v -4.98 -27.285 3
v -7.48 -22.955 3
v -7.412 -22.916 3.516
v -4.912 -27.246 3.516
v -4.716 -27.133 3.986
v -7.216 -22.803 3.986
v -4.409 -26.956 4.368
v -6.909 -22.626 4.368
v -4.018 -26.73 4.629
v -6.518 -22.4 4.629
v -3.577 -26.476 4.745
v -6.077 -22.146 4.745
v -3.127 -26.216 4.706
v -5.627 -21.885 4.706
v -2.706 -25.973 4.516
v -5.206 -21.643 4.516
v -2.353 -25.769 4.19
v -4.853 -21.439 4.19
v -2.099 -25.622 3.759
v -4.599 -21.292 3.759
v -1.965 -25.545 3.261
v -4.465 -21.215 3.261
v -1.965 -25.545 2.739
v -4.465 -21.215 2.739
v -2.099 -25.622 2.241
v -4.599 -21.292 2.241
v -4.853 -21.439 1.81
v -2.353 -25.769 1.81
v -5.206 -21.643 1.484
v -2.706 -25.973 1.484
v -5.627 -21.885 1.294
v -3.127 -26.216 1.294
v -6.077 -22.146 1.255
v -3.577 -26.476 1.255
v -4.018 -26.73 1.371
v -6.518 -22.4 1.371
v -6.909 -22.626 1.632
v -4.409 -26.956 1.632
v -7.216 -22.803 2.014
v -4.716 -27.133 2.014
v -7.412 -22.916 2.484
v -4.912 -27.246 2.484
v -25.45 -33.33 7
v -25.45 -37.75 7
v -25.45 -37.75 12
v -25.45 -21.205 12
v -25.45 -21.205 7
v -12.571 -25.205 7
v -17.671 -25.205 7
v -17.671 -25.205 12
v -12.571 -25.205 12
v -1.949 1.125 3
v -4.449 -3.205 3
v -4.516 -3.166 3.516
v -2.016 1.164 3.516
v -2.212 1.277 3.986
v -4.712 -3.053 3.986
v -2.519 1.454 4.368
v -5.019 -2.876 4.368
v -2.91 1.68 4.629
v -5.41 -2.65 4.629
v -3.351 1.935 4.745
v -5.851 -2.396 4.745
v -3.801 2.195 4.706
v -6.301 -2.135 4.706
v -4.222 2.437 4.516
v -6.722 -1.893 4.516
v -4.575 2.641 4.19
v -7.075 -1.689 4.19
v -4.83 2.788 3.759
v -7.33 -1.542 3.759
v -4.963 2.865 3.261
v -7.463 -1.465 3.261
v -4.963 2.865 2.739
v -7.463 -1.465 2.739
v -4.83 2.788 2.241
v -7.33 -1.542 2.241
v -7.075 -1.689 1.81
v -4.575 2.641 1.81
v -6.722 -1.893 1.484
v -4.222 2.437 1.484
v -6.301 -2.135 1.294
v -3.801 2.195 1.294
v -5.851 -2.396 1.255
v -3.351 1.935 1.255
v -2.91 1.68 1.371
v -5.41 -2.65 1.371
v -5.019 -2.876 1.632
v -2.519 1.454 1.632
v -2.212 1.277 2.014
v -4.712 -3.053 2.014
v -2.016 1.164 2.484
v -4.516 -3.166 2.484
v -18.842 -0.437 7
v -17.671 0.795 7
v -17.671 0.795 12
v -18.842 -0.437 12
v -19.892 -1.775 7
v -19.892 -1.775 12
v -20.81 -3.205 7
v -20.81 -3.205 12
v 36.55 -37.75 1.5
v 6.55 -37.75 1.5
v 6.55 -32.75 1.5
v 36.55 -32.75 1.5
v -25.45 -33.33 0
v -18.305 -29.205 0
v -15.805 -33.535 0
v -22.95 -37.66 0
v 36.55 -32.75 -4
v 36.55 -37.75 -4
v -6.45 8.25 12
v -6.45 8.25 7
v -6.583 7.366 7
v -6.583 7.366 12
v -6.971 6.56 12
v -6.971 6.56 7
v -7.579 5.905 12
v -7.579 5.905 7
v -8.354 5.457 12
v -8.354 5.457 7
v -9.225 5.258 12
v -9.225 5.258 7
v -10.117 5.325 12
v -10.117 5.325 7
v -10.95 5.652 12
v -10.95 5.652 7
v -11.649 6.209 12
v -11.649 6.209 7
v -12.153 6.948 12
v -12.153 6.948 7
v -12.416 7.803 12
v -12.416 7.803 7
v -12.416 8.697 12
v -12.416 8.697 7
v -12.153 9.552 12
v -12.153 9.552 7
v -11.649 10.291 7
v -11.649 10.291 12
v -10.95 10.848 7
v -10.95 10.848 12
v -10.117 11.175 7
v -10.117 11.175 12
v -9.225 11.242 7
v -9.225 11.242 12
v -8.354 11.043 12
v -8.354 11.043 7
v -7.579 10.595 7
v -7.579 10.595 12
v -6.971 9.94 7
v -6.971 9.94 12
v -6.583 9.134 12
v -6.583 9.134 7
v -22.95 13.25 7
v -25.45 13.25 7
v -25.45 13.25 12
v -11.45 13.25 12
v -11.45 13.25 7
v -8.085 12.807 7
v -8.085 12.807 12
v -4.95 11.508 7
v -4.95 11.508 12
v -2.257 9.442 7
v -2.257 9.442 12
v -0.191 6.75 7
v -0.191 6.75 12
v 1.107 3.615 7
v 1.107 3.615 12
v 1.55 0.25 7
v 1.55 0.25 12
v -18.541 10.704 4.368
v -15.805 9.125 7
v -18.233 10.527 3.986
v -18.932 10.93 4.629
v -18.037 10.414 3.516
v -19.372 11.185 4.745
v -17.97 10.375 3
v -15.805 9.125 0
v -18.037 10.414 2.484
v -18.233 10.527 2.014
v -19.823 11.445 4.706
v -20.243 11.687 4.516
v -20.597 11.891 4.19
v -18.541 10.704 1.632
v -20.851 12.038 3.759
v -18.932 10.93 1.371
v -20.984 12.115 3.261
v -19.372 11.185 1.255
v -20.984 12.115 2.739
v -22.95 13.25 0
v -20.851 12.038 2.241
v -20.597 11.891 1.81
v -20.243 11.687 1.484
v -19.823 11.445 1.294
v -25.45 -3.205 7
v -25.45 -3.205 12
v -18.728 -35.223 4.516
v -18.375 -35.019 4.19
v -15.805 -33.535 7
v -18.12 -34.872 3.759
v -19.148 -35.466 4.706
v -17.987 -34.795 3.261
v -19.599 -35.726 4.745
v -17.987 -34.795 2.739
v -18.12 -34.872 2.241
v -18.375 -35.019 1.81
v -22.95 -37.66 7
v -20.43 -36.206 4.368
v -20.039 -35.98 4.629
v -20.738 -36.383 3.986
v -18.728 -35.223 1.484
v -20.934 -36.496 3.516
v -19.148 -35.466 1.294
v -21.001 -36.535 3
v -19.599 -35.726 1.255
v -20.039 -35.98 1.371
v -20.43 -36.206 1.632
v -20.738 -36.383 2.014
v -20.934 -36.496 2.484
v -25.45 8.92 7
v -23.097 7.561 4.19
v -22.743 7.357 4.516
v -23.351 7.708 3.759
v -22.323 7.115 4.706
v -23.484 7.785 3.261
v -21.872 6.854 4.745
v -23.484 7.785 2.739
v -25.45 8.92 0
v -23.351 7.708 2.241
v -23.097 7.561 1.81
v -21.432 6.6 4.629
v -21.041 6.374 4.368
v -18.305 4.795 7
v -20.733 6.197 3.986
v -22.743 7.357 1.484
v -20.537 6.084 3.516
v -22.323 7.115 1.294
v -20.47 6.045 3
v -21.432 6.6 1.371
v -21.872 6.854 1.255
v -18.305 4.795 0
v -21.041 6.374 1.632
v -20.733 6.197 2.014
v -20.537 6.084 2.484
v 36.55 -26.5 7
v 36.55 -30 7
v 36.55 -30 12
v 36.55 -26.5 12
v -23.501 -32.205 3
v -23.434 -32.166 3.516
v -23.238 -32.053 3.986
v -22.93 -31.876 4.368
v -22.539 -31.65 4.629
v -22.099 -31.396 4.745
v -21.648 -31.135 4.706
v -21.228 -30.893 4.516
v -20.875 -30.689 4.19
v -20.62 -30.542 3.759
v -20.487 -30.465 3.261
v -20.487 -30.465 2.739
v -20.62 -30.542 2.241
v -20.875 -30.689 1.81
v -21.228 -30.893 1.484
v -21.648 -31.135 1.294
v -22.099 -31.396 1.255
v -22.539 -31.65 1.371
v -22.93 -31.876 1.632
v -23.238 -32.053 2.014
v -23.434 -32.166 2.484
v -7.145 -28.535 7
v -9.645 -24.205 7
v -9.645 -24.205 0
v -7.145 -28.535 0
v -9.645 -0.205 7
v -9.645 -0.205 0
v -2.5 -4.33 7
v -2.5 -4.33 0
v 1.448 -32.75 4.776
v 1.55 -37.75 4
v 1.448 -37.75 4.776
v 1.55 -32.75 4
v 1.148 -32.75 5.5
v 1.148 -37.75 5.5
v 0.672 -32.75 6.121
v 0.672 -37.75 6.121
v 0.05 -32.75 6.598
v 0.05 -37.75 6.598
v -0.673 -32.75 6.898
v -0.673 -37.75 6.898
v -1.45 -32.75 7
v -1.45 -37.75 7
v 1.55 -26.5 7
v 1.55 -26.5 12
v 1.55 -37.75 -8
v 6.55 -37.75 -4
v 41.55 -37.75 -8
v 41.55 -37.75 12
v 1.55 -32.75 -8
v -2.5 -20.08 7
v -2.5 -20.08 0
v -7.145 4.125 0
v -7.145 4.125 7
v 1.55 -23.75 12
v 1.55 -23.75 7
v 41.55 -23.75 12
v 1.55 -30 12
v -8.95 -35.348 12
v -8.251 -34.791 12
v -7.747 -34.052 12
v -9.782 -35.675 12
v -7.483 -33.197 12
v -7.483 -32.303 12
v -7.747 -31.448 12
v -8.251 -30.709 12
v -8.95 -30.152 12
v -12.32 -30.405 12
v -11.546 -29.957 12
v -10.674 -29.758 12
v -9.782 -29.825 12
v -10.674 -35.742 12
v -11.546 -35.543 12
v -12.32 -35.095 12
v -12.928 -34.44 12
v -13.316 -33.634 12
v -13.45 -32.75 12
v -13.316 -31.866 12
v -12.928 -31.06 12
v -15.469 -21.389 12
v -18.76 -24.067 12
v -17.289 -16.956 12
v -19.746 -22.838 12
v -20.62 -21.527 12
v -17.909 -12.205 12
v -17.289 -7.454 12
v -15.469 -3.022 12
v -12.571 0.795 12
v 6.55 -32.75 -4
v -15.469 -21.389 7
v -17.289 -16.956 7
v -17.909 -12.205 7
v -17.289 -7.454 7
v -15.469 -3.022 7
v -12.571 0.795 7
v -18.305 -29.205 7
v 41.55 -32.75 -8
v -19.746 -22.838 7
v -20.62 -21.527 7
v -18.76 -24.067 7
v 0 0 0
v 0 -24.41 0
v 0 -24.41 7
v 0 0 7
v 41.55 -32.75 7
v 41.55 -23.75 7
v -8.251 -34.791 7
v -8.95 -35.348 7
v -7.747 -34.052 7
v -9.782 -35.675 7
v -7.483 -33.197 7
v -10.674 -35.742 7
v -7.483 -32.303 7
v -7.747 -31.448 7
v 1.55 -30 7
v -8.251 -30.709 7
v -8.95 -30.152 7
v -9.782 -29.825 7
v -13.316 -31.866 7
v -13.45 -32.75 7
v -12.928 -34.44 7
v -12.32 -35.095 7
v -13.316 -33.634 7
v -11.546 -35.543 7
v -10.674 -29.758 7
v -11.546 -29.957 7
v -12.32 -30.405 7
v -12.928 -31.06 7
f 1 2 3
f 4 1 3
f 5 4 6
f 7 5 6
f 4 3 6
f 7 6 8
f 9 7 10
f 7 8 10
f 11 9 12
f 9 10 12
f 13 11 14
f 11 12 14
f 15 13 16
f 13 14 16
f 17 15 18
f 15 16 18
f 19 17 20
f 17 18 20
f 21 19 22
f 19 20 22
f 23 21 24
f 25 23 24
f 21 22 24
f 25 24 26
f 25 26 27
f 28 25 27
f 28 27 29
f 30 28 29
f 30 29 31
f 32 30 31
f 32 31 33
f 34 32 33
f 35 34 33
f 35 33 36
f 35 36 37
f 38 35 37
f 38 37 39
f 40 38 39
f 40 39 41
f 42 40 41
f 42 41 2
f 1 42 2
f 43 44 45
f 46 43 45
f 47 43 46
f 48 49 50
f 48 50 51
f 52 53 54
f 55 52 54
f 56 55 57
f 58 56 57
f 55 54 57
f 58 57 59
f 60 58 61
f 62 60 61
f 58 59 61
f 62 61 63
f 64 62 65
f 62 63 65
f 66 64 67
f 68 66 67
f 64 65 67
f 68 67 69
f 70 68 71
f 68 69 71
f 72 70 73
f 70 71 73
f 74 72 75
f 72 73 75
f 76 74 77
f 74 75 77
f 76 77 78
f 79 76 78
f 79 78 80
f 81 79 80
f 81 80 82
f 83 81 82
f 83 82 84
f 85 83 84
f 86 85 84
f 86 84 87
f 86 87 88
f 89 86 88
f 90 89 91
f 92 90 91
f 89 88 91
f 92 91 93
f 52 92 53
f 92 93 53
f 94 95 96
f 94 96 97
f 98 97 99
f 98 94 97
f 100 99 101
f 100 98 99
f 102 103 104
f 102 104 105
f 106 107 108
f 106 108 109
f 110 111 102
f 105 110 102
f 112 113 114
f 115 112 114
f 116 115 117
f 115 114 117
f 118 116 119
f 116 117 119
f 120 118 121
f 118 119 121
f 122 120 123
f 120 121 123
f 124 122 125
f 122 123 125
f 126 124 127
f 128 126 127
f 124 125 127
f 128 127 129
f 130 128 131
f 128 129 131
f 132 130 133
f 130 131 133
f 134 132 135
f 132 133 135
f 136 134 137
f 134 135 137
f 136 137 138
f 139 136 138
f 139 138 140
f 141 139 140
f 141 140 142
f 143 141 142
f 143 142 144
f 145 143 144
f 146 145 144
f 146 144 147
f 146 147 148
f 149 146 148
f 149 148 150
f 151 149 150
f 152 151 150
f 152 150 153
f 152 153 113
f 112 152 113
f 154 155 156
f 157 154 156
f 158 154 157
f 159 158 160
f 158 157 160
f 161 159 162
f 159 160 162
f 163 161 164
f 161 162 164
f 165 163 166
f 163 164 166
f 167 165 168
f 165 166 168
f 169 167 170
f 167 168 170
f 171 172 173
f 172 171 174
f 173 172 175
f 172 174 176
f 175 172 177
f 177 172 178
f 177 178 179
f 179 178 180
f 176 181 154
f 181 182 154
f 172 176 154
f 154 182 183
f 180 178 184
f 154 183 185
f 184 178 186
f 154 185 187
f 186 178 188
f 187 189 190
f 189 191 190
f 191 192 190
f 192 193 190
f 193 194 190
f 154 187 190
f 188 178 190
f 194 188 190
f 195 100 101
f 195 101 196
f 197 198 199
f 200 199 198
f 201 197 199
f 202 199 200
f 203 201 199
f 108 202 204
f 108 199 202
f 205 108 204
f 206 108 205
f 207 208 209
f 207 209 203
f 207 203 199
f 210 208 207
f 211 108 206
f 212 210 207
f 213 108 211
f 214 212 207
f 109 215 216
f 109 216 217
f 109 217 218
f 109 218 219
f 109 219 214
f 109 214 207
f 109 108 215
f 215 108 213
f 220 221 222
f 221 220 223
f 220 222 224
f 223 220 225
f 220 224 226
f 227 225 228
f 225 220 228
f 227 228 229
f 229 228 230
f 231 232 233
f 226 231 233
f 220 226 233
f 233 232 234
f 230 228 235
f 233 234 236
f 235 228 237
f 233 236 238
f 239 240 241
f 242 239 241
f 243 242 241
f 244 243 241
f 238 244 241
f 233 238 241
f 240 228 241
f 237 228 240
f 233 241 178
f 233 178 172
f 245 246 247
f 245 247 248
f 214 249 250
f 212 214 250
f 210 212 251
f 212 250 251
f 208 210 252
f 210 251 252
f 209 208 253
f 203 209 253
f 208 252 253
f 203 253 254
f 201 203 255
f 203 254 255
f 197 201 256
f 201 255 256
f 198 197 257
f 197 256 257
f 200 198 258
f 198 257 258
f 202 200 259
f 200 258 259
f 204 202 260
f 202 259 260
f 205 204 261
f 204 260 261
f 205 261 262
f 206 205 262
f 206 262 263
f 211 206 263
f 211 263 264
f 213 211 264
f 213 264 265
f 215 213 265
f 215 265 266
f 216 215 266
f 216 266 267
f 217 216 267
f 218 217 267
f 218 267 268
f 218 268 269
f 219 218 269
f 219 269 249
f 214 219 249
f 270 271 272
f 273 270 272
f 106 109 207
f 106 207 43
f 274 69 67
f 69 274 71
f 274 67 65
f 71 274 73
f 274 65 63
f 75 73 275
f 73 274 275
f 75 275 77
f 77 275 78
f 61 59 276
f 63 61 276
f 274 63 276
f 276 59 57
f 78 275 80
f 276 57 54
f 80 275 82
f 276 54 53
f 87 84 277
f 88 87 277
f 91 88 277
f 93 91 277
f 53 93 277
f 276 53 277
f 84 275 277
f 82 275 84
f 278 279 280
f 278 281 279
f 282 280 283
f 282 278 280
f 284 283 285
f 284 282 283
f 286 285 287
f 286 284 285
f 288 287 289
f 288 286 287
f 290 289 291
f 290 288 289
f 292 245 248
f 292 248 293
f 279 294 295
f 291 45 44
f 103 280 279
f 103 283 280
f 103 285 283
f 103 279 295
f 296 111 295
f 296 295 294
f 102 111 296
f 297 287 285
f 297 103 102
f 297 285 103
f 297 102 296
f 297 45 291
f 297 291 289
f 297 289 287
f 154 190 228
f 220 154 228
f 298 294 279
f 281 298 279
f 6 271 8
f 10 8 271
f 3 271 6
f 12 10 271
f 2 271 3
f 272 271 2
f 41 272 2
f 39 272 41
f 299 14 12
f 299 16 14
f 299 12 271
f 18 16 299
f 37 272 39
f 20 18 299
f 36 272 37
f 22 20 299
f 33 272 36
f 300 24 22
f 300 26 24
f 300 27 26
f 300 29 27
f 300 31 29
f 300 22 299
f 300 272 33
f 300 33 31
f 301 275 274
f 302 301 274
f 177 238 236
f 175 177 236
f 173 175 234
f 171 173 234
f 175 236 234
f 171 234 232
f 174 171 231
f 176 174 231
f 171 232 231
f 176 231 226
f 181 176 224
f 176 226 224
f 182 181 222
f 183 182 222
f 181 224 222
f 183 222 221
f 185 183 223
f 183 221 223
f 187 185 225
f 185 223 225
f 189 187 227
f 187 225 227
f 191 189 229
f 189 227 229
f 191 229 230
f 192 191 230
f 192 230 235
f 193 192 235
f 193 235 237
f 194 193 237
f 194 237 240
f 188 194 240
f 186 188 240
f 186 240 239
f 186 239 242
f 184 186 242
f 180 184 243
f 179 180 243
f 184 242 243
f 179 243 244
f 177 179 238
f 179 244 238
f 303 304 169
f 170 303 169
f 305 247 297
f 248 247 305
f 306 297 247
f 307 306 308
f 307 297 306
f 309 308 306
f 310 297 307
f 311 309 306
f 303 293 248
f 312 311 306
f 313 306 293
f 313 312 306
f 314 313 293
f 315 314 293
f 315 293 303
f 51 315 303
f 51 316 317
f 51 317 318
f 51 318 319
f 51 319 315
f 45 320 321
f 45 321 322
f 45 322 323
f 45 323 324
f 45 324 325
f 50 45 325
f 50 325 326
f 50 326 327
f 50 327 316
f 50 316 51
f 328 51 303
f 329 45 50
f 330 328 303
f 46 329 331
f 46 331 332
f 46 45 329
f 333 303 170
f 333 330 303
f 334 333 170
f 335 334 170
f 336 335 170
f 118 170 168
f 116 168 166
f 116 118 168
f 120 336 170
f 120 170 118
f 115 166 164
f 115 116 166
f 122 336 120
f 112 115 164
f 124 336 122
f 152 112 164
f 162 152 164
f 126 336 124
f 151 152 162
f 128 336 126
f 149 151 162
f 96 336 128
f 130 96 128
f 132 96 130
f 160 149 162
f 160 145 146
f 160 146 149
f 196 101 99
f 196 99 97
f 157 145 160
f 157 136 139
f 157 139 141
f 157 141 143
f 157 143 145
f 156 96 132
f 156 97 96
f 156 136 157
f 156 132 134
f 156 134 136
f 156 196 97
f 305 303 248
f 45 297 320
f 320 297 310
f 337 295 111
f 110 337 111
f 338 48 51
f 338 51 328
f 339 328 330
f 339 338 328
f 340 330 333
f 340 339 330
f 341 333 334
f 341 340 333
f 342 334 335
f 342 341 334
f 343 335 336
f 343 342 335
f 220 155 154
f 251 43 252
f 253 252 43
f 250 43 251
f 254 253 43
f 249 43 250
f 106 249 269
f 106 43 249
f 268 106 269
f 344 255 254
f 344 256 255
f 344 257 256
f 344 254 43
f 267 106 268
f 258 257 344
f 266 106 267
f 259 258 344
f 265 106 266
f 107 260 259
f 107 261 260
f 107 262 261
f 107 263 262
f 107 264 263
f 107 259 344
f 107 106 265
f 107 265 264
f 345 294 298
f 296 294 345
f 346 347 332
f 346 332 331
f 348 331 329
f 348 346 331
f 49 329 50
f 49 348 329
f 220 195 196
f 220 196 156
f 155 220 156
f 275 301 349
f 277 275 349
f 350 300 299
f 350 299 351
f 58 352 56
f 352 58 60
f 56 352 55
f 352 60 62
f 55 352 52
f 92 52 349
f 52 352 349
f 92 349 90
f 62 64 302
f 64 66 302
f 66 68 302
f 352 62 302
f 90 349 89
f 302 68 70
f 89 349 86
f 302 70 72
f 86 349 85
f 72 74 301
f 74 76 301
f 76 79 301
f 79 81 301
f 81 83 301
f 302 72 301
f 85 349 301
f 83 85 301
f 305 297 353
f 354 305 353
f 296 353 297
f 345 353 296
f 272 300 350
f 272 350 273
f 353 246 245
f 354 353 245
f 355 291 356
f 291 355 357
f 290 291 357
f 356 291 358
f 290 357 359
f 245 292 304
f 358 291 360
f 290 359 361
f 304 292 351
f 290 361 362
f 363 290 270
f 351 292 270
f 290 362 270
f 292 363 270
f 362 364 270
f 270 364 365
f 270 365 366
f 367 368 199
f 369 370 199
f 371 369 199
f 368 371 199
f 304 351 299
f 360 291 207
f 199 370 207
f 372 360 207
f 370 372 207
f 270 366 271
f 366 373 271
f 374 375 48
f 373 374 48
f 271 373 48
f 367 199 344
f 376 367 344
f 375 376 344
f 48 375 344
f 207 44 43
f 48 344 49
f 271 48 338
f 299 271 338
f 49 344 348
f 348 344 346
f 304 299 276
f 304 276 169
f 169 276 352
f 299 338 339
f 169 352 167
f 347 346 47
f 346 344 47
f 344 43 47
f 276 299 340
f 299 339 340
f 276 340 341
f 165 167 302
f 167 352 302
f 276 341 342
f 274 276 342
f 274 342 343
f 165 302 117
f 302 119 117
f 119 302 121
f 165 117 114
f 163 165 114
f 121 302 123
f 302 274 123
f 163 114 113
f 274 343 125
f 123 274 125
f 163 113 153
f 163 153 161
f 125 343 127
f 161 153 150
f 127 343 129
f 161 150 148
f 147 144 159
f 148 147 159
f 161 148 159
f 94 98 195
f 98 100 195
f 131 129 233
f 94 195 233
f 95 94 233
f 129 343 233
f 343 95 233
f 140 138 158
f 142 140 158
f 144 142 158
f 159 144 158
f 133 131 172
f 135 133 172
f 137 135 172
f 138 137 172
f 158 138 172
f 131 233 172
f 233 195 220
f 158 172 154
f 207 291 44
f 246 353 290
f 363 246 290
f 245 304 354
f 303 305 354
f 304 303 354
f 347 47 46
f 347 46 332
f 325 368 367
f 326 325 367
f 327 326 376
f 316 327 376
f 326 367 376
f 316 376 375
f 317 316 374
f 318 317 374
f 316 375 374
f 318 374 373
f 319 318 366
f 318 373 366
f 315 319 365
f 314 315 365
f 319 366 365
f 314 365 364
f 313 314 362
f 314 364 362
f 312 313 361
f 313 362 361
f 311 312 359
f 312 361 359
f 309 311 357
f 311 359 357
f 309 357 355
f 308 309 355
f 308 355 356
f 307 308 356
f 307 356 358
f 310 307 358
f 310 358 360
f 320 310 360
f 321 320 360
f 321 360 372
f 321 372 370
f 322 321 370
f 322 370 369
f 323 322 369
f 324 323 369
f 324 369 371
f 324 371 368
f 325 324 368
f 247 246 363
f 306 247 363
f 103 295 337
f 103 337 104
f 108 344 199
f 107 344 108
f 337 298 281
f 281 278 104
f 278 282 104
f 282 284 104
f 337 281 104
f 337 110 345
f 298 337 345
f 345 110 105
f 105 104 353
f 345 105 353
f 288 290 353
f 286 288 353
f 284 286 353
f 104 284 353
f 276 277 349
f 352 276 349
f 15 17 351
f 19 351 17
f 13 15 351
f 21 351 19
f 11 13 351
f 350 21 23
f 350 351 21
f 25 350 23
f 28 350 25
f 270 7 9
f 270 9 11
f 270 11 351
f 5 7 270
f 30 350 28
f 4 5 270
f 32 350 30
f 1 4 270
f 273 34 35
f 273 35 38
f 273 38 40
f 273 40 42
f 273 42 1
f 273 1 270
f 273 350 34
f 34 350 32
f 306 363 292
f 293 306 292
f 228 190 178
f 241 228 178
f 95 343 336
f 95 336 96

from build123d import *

# Parameters (mm, degrees)
SALIENTE_EXTRUIR1_DEPTH   = 7
SALIENTE_EXTRUIR1_2_DEPTH = 7
CROQUIS2_W                = 27
CROQUIS2_H                = 51
SALIENTE_EXTRUIR2_DEPTH   = 5
CORTAR_EXTRUIR1_REACH     = 48.062
CROQUIS4_R                = 1.75
CORTAR_EXTRUIR2_DEPTH     = 5
CORTAR_EXTRUIR3_REACH     = 46.821
CROQUIS5_R                = 1.75
REDONDEO1_R               = 13
CROQUIS6_W                = 40
CROQUIS6_H                = 20
CROQUIS6_W_2              = 30
CROQUIS6_H_2              = 5.5
SALIENTE_EXTRUIR3_DEPTH   = 5
REDONDEO5_R               = 3
CORTAR_EXTRUIR4_REACH     = 46.821
CROQUIS7_W                = 10
CROQUIS7_H                = 7
CORTAR_EXTRUIR5_REACH     = 58.58
CROQUIS8_W                = 10
CROQUIS8_H                = 7
CORTAR_EXTRUIR6_REACH     = 60.108
CROQUIS10_W               = 5
CROQUIS10_H               = 9
SALIENTE_EXTRUIR4_DEPTH   = 40
CORTAR_EXTRUIR7_REACH     = 60.108
CROQUIS11_W               = 35
CROQUIS11_H               = 3.5
CORTAR_EXTRUIR8_REACH     = 60.108
CROQUIS12_R               = 3


with BuildPart() as part:
    # Croquis1 → Saliente-Extruir1 (new body)
    with BuildSketch(Plane.XY):
        Polygon((0, 0), (-22.9496732, 13.25), (-25.4496732, 8.919872981), (-2.5, -4.330127019), align=None)
    extrude(amount=SALIENTE_EXTRUIR1_DEPTH)



with BuildPart() as body_2:
    # Croquis1 → Saliente-Extruir1 2 (new body)
    with BuildSketch(Plane.XY):
        Polygon((-25.4496732, -33.330127019), (-2.5, -20.080127019), (0, -24.410254038), (-22.9496732, -37.660254038), align=None)
    extrude(amount=SALIENTE_EXTRUIR1_2_DEPTH)


with BuildPart() as part_1:
    add(part.part)

    add(body_2.part)  # Saliente-Extruir2 merges body 2
    # Croquis2 → Saliente-Extruir2 (add)
    with BuildSketch(Plane.XY.offset(7)):
        with Locations((-11.9496732, -12.25)):
            Rectangle(CROQUIS2_W, CROQUIS2_H)
    extrude(amount=SALIENTE_EXTRUIR2_DEPTH)

    # Croquis3 → Cortar-Extruir1 (cut, up to next)
    with BuildSketch(Plane(origin=(0, 0, 7), x_dir=(-1, 0, 0), z_dir=(0, 0, -1)), mode=Mode.PRIVATE) as cortar_extruir1_sk1:
        with BuildLine():
            Line((13.571492094, 0.794872981), (16.671492094, 0.794872981))
            Line((16.671492094, 0.794872981), (17.671492094, 0.794872981))
            ThreePointArc((17.671492094, 0.794872981), (23.221592496, -12.205127019), (17.671492094, -25.205127019))
            Line((17.671492094, -25.205127019), (16.671492094, -25.205127019))
            Line((16.671492094, -25.205127019), (13.571492094, -25.205127019))
            Line((13.571492094, -25.205127019), (12.571492094, -25.205127019))
            ThreePointArc((12.571492094, -25.205127019), (17.909045513, -12.205127019), (12.571492094, 0.794872981))
            Line((12.571492094, 0.794872981), (13.571492094, 0.794872981))
        make_face()
    cortar_extruir1_tool1 = extrude(cortar_extruir1_sk1.sketch, amount=-CORTAR_EXTRUIR1_REACH, mode=Mode.PRIVATE) & part_1.part
    add(cortar_extruir1_tool1.solids().sort_by_distance((-18.892381, -12.205127, 7))[0], mode=Mode.SUBTRACT)

    # Croquis4 → Cortar-Extruir2 (cut)
    with BuildSketch(Plane(origin=(-2.5, -4.330127019, 0), x_dir=(0.8660254037844369, -0.5000000000000031, 0), z_dir=(-0.500000000000003, -0.8660254037844368, 0))):
        with Locations((-22.5, 3)):
            Circle(CROQUIS4_R)
        with Locations((-4, 3)):
            Circle(CROQUIS4_R)
    extrude(amount=-CORTAR_EXTRUIR2_DEPTH, mode=Mode.SUBTRACT)

    # Croquis5 → Cortar-Extruir3 (cut, up to next)
    with BuildSketch(Plane(origin=(8.069950055, -13.977563509, 0), x_dir=(0.8660254037844367, 0.5000000000000033, 0), z_dir=(-0.5000000000000033, 0.8660254037844367, 0)), mode=Mode.PRIVATE) as cortar_extruir3_sk1:
        with Locations(Location((-34.705127019, -3, 0), (0, 0, 180))):
            Circle(CROQUIS5_R)
    cortar_extruir3_tool1 = extrude(cortar_extruir3_sk1.sketch, amount=-CORTAR_EXTRUIR3_REACH, mode=Mode.PRIVATE) & part_1.part
    # Croquis5 → Cortar-Extruir3 (cut, up to next)
    with BuildSketch(Plane(origin=(8.069950055, -13.977563509, 0), x_dir=(0.8660254037844367, 0.5000000000000033, 0), z_dir=(-0.5000000000000033, 0.8660254037844367, 0)), mode=Mode.PRIVATE) as cortar_extruir3_sk2:
        with Locations(Location((-16.205127019, -3, 0), (0, 0, 180))):
            Circle(CROQUIS5_R)
    cortar_extruir3_tool2 = extrude(cortar_extruir3_sk2.sketch, amount=-CORTAR_EXTRUIR3_REACH, mode=Mode.PRIVATE) & part_1.part
    add(cortar_extruir3_tool1.solids().sort_by_distance((-21.985572, -31.330127, 3))[0], mode=Mode.SUBTRACT)
    add(cortar_extruir3_tool2.solids().sort_by_distance((-5.964102, -22.080127, 3))[0], mode=Mode.SUBTRACT)

    # Redondeo1
    redondeo1_edges = [part_1.edges().sort_by_distance(p)[0] for p in [
        (1.5503268, 13.25, 9.5),
    ]]
    fillet(redondeo1_edges, radius=REDONDEO1_R)

    # Croquis6 → Saliente-Extruir3 (add)
    with BuildSketch(Plane.XZ.offset(37.75)):
        with Locations((21.5503268, 2)):
            Rectangle(CROQUIS6_W, CROQUIS6_H)
        with Locations((21.5503268, -1.25)):
            Rectangle(CROQUIS6_W_2, CROQUIS6_H_2, mode=Mode.SUBTRACT)
    extrude(amount=-SALIENTE_EXTRUIR3_DEPTH)

    # Redondeo5
    redondeo5_edges = [part_1.edges().sort_by_distance(p)[0] for p in [
        (1.5503268, -35.25, 7),
    ]]
    fillet(redondeo5_edges, radius=REDONDEO5_R)

    # Croquis7 → Cortar-Extruir4 (cut, up to next)
    with BuildSketch(Plane(origin=(8.069950055, -13.977563509, 0), x_dir=(0.8660254037844367, 0.5000000000000033, 0), z_dir=(-0.5000000000000033, 0.8660254037844367, 0)), mode=Mode.PRIVATE) as cortar_extruir4_sk1:
        with Locations((-25.455127019, -3.5)):
            Rectangle(CROQUIS7_W, CROQUIS7_H)
    cortar_extruir4_tool1 = extrude(cortar_extruir4_sk1.sketch, amount=-CORTAR_EXTRUIR4_REACH, mode=Mode.PRIVATE) & part_1.part
    add(cortar_extruir4_tool1.solids().sort_by_distance((-13.974837, -26.705127, 3.5))[0], mode=Mode.SUBTRACT)

    # Croquis8 → Cortar-Extruir5 (cut, up to next)
    with BuildSketch(Plane(origin=(-2.5, -4.330127019, 0), x_dir=(0.8660254037844369, -0.5000000000000031, 0), z_dir=(-0.500000000000003, -0.8660254037844368, 0)), mode=Mode.PRIVATE) as cortar_extruir5_sk1:
        with Locations((-13.25, 3.5)):
            Rectangle(CROQUIS8_W, CROQUIS8_H)
    cortar_extruir5_tool1 = extrude(cortar_extruir5_sk1.sketch, amount=-CORTAR_EXTRUIR5_REACH, mode=Mode.PRIVATE) & part_1.part
    add(cortar_extruir5_tool1.solids().sort_by_distance((-13.974837, 2.294873, 3.5))[0], mode=Mode.SUBTRACT)

    # Croquis9 → Cortar-Extruir6 (cut, up to next)
    with BuildSketch(Plane(origin=(0, 0, 7), x_dir=(-1, 0, 0), z_dir=(0, 0, -1)), mode=Mode.PRIVATE) as cortar_extruir6_sk1:
        with BuildLine():
            Line((25.4496732, -3.205127019), (25.4496732, -21.205127019))
            Line((25.4496732, -21.205127019), (20.619740445, -21.526985187))
            ThreePointArc((20.619740445, -21.526985187), (23.220621564, -12.392083108), (20.810049764, -3.205127019))
            Line((20.810049764, -3.205127019), (25.4496732, -3.205127019))
        make_face()
    cortar_extruir6_tool1 = extrude(cortar_extruir6_sk1.sketch, amount=-CORTAR_EXTRUIR6_REACH, mode=Mode.PRIVATE) & part_1.part
    add(cortar_extruir6_tool1.solids().sort_by_distance((-23.839782, -12.328925, 7))[0], mode=Mode.SUBTRACT)

    # Croquis10 → Saliente-Extruir4 (add)
    with BuildSketch(Plane(origin=(1.5503268, 0, 0), x_dir=(0, 0, -1), z_dir=(1, 0, 0))):
        with Locations((-9.5, -28.25)):
            Rectangle(CROQUIS10_W, CROQUIS10_H)
    extrude(amount=SALIENTE_EXTRUIR4_DEPTH)

    # Croquis11 → Cortar-Extruir7 (cut, up to next)
    with BuildSketch(Plane(origin=(0, 0, 7), x_dir=(-1, 0, 0), z_dir=(0, 0, -1)), mode=Mode.PRIVATE) as cortar_extruir7_sk1:
        with Locations((-19.0503268, -28.25)):
            Rectangle(CROQUIS11_W, CROQUIS11_H)
    cortar_extruir7_tool1 = extrude(cortar_extruir7_sk1.sketch, amount=-CORTAR_EXTRUIR7_REACH, mode=Mode.PRIVATE) & part_1.part
    add(cortar_extruir7_tool1.solids().sort_by_distance((19.050327, -28.25, 7))[0], mode=Mode.SUBTRACT)

    # Croquis12 → Cortar-Extruir8 (cut, up to next)
    with BuildSketch(Plane(origin=(0, 0, 7), x_dir=(-1, 0, 0), z_dir=(0, 0, -1)), mode=Mode.PRIVATE) as cortar_extruir8_sk1:
        with Locations((10.4496732, -32.75)):
            Circle(CROQUIS12_R)
    cortar_extruir8_tool1 = extrude(cortar_extruir8_sk1.sketch, amount=-CORTAR_EXTRUIR8_REACH, mode=Mode.PRIVATE) & part_1.part
    # Croquis12 → Cortar-Extruir8 (cut, up to next)
    with BuildSketch(Plane(origin=(0, 0, 7), x_dir=(-1, 0, 0), z_dir=(0, 0, -1)), mode=Mode.PRIVATE) as cortar_extruir8_sk2:
        with Locations(Location((9.4496732, 8.25, 0), (0, 0, 180))):
            Circle(CROQUIS12_R)
    cortar_extruir8_tool2 = extrude(cortar_extruir8_sk2.sketch, amount=-CORTAR_EXTRUIR8_REACH, mode=Mode.PRIVATE) & part_1.part
    add(cortar_extruir8_tool1.solids().sort_by_distance((-10.449673, -32.75, 7))[0], mode=Mode.SUBTRACT)
    add(cortar_extruir8_tool2.solids().sort_by_distance((-9.449673, 8.25, 7))[0], mode=Mode.SUBTRACT)


solid = part_1.part
